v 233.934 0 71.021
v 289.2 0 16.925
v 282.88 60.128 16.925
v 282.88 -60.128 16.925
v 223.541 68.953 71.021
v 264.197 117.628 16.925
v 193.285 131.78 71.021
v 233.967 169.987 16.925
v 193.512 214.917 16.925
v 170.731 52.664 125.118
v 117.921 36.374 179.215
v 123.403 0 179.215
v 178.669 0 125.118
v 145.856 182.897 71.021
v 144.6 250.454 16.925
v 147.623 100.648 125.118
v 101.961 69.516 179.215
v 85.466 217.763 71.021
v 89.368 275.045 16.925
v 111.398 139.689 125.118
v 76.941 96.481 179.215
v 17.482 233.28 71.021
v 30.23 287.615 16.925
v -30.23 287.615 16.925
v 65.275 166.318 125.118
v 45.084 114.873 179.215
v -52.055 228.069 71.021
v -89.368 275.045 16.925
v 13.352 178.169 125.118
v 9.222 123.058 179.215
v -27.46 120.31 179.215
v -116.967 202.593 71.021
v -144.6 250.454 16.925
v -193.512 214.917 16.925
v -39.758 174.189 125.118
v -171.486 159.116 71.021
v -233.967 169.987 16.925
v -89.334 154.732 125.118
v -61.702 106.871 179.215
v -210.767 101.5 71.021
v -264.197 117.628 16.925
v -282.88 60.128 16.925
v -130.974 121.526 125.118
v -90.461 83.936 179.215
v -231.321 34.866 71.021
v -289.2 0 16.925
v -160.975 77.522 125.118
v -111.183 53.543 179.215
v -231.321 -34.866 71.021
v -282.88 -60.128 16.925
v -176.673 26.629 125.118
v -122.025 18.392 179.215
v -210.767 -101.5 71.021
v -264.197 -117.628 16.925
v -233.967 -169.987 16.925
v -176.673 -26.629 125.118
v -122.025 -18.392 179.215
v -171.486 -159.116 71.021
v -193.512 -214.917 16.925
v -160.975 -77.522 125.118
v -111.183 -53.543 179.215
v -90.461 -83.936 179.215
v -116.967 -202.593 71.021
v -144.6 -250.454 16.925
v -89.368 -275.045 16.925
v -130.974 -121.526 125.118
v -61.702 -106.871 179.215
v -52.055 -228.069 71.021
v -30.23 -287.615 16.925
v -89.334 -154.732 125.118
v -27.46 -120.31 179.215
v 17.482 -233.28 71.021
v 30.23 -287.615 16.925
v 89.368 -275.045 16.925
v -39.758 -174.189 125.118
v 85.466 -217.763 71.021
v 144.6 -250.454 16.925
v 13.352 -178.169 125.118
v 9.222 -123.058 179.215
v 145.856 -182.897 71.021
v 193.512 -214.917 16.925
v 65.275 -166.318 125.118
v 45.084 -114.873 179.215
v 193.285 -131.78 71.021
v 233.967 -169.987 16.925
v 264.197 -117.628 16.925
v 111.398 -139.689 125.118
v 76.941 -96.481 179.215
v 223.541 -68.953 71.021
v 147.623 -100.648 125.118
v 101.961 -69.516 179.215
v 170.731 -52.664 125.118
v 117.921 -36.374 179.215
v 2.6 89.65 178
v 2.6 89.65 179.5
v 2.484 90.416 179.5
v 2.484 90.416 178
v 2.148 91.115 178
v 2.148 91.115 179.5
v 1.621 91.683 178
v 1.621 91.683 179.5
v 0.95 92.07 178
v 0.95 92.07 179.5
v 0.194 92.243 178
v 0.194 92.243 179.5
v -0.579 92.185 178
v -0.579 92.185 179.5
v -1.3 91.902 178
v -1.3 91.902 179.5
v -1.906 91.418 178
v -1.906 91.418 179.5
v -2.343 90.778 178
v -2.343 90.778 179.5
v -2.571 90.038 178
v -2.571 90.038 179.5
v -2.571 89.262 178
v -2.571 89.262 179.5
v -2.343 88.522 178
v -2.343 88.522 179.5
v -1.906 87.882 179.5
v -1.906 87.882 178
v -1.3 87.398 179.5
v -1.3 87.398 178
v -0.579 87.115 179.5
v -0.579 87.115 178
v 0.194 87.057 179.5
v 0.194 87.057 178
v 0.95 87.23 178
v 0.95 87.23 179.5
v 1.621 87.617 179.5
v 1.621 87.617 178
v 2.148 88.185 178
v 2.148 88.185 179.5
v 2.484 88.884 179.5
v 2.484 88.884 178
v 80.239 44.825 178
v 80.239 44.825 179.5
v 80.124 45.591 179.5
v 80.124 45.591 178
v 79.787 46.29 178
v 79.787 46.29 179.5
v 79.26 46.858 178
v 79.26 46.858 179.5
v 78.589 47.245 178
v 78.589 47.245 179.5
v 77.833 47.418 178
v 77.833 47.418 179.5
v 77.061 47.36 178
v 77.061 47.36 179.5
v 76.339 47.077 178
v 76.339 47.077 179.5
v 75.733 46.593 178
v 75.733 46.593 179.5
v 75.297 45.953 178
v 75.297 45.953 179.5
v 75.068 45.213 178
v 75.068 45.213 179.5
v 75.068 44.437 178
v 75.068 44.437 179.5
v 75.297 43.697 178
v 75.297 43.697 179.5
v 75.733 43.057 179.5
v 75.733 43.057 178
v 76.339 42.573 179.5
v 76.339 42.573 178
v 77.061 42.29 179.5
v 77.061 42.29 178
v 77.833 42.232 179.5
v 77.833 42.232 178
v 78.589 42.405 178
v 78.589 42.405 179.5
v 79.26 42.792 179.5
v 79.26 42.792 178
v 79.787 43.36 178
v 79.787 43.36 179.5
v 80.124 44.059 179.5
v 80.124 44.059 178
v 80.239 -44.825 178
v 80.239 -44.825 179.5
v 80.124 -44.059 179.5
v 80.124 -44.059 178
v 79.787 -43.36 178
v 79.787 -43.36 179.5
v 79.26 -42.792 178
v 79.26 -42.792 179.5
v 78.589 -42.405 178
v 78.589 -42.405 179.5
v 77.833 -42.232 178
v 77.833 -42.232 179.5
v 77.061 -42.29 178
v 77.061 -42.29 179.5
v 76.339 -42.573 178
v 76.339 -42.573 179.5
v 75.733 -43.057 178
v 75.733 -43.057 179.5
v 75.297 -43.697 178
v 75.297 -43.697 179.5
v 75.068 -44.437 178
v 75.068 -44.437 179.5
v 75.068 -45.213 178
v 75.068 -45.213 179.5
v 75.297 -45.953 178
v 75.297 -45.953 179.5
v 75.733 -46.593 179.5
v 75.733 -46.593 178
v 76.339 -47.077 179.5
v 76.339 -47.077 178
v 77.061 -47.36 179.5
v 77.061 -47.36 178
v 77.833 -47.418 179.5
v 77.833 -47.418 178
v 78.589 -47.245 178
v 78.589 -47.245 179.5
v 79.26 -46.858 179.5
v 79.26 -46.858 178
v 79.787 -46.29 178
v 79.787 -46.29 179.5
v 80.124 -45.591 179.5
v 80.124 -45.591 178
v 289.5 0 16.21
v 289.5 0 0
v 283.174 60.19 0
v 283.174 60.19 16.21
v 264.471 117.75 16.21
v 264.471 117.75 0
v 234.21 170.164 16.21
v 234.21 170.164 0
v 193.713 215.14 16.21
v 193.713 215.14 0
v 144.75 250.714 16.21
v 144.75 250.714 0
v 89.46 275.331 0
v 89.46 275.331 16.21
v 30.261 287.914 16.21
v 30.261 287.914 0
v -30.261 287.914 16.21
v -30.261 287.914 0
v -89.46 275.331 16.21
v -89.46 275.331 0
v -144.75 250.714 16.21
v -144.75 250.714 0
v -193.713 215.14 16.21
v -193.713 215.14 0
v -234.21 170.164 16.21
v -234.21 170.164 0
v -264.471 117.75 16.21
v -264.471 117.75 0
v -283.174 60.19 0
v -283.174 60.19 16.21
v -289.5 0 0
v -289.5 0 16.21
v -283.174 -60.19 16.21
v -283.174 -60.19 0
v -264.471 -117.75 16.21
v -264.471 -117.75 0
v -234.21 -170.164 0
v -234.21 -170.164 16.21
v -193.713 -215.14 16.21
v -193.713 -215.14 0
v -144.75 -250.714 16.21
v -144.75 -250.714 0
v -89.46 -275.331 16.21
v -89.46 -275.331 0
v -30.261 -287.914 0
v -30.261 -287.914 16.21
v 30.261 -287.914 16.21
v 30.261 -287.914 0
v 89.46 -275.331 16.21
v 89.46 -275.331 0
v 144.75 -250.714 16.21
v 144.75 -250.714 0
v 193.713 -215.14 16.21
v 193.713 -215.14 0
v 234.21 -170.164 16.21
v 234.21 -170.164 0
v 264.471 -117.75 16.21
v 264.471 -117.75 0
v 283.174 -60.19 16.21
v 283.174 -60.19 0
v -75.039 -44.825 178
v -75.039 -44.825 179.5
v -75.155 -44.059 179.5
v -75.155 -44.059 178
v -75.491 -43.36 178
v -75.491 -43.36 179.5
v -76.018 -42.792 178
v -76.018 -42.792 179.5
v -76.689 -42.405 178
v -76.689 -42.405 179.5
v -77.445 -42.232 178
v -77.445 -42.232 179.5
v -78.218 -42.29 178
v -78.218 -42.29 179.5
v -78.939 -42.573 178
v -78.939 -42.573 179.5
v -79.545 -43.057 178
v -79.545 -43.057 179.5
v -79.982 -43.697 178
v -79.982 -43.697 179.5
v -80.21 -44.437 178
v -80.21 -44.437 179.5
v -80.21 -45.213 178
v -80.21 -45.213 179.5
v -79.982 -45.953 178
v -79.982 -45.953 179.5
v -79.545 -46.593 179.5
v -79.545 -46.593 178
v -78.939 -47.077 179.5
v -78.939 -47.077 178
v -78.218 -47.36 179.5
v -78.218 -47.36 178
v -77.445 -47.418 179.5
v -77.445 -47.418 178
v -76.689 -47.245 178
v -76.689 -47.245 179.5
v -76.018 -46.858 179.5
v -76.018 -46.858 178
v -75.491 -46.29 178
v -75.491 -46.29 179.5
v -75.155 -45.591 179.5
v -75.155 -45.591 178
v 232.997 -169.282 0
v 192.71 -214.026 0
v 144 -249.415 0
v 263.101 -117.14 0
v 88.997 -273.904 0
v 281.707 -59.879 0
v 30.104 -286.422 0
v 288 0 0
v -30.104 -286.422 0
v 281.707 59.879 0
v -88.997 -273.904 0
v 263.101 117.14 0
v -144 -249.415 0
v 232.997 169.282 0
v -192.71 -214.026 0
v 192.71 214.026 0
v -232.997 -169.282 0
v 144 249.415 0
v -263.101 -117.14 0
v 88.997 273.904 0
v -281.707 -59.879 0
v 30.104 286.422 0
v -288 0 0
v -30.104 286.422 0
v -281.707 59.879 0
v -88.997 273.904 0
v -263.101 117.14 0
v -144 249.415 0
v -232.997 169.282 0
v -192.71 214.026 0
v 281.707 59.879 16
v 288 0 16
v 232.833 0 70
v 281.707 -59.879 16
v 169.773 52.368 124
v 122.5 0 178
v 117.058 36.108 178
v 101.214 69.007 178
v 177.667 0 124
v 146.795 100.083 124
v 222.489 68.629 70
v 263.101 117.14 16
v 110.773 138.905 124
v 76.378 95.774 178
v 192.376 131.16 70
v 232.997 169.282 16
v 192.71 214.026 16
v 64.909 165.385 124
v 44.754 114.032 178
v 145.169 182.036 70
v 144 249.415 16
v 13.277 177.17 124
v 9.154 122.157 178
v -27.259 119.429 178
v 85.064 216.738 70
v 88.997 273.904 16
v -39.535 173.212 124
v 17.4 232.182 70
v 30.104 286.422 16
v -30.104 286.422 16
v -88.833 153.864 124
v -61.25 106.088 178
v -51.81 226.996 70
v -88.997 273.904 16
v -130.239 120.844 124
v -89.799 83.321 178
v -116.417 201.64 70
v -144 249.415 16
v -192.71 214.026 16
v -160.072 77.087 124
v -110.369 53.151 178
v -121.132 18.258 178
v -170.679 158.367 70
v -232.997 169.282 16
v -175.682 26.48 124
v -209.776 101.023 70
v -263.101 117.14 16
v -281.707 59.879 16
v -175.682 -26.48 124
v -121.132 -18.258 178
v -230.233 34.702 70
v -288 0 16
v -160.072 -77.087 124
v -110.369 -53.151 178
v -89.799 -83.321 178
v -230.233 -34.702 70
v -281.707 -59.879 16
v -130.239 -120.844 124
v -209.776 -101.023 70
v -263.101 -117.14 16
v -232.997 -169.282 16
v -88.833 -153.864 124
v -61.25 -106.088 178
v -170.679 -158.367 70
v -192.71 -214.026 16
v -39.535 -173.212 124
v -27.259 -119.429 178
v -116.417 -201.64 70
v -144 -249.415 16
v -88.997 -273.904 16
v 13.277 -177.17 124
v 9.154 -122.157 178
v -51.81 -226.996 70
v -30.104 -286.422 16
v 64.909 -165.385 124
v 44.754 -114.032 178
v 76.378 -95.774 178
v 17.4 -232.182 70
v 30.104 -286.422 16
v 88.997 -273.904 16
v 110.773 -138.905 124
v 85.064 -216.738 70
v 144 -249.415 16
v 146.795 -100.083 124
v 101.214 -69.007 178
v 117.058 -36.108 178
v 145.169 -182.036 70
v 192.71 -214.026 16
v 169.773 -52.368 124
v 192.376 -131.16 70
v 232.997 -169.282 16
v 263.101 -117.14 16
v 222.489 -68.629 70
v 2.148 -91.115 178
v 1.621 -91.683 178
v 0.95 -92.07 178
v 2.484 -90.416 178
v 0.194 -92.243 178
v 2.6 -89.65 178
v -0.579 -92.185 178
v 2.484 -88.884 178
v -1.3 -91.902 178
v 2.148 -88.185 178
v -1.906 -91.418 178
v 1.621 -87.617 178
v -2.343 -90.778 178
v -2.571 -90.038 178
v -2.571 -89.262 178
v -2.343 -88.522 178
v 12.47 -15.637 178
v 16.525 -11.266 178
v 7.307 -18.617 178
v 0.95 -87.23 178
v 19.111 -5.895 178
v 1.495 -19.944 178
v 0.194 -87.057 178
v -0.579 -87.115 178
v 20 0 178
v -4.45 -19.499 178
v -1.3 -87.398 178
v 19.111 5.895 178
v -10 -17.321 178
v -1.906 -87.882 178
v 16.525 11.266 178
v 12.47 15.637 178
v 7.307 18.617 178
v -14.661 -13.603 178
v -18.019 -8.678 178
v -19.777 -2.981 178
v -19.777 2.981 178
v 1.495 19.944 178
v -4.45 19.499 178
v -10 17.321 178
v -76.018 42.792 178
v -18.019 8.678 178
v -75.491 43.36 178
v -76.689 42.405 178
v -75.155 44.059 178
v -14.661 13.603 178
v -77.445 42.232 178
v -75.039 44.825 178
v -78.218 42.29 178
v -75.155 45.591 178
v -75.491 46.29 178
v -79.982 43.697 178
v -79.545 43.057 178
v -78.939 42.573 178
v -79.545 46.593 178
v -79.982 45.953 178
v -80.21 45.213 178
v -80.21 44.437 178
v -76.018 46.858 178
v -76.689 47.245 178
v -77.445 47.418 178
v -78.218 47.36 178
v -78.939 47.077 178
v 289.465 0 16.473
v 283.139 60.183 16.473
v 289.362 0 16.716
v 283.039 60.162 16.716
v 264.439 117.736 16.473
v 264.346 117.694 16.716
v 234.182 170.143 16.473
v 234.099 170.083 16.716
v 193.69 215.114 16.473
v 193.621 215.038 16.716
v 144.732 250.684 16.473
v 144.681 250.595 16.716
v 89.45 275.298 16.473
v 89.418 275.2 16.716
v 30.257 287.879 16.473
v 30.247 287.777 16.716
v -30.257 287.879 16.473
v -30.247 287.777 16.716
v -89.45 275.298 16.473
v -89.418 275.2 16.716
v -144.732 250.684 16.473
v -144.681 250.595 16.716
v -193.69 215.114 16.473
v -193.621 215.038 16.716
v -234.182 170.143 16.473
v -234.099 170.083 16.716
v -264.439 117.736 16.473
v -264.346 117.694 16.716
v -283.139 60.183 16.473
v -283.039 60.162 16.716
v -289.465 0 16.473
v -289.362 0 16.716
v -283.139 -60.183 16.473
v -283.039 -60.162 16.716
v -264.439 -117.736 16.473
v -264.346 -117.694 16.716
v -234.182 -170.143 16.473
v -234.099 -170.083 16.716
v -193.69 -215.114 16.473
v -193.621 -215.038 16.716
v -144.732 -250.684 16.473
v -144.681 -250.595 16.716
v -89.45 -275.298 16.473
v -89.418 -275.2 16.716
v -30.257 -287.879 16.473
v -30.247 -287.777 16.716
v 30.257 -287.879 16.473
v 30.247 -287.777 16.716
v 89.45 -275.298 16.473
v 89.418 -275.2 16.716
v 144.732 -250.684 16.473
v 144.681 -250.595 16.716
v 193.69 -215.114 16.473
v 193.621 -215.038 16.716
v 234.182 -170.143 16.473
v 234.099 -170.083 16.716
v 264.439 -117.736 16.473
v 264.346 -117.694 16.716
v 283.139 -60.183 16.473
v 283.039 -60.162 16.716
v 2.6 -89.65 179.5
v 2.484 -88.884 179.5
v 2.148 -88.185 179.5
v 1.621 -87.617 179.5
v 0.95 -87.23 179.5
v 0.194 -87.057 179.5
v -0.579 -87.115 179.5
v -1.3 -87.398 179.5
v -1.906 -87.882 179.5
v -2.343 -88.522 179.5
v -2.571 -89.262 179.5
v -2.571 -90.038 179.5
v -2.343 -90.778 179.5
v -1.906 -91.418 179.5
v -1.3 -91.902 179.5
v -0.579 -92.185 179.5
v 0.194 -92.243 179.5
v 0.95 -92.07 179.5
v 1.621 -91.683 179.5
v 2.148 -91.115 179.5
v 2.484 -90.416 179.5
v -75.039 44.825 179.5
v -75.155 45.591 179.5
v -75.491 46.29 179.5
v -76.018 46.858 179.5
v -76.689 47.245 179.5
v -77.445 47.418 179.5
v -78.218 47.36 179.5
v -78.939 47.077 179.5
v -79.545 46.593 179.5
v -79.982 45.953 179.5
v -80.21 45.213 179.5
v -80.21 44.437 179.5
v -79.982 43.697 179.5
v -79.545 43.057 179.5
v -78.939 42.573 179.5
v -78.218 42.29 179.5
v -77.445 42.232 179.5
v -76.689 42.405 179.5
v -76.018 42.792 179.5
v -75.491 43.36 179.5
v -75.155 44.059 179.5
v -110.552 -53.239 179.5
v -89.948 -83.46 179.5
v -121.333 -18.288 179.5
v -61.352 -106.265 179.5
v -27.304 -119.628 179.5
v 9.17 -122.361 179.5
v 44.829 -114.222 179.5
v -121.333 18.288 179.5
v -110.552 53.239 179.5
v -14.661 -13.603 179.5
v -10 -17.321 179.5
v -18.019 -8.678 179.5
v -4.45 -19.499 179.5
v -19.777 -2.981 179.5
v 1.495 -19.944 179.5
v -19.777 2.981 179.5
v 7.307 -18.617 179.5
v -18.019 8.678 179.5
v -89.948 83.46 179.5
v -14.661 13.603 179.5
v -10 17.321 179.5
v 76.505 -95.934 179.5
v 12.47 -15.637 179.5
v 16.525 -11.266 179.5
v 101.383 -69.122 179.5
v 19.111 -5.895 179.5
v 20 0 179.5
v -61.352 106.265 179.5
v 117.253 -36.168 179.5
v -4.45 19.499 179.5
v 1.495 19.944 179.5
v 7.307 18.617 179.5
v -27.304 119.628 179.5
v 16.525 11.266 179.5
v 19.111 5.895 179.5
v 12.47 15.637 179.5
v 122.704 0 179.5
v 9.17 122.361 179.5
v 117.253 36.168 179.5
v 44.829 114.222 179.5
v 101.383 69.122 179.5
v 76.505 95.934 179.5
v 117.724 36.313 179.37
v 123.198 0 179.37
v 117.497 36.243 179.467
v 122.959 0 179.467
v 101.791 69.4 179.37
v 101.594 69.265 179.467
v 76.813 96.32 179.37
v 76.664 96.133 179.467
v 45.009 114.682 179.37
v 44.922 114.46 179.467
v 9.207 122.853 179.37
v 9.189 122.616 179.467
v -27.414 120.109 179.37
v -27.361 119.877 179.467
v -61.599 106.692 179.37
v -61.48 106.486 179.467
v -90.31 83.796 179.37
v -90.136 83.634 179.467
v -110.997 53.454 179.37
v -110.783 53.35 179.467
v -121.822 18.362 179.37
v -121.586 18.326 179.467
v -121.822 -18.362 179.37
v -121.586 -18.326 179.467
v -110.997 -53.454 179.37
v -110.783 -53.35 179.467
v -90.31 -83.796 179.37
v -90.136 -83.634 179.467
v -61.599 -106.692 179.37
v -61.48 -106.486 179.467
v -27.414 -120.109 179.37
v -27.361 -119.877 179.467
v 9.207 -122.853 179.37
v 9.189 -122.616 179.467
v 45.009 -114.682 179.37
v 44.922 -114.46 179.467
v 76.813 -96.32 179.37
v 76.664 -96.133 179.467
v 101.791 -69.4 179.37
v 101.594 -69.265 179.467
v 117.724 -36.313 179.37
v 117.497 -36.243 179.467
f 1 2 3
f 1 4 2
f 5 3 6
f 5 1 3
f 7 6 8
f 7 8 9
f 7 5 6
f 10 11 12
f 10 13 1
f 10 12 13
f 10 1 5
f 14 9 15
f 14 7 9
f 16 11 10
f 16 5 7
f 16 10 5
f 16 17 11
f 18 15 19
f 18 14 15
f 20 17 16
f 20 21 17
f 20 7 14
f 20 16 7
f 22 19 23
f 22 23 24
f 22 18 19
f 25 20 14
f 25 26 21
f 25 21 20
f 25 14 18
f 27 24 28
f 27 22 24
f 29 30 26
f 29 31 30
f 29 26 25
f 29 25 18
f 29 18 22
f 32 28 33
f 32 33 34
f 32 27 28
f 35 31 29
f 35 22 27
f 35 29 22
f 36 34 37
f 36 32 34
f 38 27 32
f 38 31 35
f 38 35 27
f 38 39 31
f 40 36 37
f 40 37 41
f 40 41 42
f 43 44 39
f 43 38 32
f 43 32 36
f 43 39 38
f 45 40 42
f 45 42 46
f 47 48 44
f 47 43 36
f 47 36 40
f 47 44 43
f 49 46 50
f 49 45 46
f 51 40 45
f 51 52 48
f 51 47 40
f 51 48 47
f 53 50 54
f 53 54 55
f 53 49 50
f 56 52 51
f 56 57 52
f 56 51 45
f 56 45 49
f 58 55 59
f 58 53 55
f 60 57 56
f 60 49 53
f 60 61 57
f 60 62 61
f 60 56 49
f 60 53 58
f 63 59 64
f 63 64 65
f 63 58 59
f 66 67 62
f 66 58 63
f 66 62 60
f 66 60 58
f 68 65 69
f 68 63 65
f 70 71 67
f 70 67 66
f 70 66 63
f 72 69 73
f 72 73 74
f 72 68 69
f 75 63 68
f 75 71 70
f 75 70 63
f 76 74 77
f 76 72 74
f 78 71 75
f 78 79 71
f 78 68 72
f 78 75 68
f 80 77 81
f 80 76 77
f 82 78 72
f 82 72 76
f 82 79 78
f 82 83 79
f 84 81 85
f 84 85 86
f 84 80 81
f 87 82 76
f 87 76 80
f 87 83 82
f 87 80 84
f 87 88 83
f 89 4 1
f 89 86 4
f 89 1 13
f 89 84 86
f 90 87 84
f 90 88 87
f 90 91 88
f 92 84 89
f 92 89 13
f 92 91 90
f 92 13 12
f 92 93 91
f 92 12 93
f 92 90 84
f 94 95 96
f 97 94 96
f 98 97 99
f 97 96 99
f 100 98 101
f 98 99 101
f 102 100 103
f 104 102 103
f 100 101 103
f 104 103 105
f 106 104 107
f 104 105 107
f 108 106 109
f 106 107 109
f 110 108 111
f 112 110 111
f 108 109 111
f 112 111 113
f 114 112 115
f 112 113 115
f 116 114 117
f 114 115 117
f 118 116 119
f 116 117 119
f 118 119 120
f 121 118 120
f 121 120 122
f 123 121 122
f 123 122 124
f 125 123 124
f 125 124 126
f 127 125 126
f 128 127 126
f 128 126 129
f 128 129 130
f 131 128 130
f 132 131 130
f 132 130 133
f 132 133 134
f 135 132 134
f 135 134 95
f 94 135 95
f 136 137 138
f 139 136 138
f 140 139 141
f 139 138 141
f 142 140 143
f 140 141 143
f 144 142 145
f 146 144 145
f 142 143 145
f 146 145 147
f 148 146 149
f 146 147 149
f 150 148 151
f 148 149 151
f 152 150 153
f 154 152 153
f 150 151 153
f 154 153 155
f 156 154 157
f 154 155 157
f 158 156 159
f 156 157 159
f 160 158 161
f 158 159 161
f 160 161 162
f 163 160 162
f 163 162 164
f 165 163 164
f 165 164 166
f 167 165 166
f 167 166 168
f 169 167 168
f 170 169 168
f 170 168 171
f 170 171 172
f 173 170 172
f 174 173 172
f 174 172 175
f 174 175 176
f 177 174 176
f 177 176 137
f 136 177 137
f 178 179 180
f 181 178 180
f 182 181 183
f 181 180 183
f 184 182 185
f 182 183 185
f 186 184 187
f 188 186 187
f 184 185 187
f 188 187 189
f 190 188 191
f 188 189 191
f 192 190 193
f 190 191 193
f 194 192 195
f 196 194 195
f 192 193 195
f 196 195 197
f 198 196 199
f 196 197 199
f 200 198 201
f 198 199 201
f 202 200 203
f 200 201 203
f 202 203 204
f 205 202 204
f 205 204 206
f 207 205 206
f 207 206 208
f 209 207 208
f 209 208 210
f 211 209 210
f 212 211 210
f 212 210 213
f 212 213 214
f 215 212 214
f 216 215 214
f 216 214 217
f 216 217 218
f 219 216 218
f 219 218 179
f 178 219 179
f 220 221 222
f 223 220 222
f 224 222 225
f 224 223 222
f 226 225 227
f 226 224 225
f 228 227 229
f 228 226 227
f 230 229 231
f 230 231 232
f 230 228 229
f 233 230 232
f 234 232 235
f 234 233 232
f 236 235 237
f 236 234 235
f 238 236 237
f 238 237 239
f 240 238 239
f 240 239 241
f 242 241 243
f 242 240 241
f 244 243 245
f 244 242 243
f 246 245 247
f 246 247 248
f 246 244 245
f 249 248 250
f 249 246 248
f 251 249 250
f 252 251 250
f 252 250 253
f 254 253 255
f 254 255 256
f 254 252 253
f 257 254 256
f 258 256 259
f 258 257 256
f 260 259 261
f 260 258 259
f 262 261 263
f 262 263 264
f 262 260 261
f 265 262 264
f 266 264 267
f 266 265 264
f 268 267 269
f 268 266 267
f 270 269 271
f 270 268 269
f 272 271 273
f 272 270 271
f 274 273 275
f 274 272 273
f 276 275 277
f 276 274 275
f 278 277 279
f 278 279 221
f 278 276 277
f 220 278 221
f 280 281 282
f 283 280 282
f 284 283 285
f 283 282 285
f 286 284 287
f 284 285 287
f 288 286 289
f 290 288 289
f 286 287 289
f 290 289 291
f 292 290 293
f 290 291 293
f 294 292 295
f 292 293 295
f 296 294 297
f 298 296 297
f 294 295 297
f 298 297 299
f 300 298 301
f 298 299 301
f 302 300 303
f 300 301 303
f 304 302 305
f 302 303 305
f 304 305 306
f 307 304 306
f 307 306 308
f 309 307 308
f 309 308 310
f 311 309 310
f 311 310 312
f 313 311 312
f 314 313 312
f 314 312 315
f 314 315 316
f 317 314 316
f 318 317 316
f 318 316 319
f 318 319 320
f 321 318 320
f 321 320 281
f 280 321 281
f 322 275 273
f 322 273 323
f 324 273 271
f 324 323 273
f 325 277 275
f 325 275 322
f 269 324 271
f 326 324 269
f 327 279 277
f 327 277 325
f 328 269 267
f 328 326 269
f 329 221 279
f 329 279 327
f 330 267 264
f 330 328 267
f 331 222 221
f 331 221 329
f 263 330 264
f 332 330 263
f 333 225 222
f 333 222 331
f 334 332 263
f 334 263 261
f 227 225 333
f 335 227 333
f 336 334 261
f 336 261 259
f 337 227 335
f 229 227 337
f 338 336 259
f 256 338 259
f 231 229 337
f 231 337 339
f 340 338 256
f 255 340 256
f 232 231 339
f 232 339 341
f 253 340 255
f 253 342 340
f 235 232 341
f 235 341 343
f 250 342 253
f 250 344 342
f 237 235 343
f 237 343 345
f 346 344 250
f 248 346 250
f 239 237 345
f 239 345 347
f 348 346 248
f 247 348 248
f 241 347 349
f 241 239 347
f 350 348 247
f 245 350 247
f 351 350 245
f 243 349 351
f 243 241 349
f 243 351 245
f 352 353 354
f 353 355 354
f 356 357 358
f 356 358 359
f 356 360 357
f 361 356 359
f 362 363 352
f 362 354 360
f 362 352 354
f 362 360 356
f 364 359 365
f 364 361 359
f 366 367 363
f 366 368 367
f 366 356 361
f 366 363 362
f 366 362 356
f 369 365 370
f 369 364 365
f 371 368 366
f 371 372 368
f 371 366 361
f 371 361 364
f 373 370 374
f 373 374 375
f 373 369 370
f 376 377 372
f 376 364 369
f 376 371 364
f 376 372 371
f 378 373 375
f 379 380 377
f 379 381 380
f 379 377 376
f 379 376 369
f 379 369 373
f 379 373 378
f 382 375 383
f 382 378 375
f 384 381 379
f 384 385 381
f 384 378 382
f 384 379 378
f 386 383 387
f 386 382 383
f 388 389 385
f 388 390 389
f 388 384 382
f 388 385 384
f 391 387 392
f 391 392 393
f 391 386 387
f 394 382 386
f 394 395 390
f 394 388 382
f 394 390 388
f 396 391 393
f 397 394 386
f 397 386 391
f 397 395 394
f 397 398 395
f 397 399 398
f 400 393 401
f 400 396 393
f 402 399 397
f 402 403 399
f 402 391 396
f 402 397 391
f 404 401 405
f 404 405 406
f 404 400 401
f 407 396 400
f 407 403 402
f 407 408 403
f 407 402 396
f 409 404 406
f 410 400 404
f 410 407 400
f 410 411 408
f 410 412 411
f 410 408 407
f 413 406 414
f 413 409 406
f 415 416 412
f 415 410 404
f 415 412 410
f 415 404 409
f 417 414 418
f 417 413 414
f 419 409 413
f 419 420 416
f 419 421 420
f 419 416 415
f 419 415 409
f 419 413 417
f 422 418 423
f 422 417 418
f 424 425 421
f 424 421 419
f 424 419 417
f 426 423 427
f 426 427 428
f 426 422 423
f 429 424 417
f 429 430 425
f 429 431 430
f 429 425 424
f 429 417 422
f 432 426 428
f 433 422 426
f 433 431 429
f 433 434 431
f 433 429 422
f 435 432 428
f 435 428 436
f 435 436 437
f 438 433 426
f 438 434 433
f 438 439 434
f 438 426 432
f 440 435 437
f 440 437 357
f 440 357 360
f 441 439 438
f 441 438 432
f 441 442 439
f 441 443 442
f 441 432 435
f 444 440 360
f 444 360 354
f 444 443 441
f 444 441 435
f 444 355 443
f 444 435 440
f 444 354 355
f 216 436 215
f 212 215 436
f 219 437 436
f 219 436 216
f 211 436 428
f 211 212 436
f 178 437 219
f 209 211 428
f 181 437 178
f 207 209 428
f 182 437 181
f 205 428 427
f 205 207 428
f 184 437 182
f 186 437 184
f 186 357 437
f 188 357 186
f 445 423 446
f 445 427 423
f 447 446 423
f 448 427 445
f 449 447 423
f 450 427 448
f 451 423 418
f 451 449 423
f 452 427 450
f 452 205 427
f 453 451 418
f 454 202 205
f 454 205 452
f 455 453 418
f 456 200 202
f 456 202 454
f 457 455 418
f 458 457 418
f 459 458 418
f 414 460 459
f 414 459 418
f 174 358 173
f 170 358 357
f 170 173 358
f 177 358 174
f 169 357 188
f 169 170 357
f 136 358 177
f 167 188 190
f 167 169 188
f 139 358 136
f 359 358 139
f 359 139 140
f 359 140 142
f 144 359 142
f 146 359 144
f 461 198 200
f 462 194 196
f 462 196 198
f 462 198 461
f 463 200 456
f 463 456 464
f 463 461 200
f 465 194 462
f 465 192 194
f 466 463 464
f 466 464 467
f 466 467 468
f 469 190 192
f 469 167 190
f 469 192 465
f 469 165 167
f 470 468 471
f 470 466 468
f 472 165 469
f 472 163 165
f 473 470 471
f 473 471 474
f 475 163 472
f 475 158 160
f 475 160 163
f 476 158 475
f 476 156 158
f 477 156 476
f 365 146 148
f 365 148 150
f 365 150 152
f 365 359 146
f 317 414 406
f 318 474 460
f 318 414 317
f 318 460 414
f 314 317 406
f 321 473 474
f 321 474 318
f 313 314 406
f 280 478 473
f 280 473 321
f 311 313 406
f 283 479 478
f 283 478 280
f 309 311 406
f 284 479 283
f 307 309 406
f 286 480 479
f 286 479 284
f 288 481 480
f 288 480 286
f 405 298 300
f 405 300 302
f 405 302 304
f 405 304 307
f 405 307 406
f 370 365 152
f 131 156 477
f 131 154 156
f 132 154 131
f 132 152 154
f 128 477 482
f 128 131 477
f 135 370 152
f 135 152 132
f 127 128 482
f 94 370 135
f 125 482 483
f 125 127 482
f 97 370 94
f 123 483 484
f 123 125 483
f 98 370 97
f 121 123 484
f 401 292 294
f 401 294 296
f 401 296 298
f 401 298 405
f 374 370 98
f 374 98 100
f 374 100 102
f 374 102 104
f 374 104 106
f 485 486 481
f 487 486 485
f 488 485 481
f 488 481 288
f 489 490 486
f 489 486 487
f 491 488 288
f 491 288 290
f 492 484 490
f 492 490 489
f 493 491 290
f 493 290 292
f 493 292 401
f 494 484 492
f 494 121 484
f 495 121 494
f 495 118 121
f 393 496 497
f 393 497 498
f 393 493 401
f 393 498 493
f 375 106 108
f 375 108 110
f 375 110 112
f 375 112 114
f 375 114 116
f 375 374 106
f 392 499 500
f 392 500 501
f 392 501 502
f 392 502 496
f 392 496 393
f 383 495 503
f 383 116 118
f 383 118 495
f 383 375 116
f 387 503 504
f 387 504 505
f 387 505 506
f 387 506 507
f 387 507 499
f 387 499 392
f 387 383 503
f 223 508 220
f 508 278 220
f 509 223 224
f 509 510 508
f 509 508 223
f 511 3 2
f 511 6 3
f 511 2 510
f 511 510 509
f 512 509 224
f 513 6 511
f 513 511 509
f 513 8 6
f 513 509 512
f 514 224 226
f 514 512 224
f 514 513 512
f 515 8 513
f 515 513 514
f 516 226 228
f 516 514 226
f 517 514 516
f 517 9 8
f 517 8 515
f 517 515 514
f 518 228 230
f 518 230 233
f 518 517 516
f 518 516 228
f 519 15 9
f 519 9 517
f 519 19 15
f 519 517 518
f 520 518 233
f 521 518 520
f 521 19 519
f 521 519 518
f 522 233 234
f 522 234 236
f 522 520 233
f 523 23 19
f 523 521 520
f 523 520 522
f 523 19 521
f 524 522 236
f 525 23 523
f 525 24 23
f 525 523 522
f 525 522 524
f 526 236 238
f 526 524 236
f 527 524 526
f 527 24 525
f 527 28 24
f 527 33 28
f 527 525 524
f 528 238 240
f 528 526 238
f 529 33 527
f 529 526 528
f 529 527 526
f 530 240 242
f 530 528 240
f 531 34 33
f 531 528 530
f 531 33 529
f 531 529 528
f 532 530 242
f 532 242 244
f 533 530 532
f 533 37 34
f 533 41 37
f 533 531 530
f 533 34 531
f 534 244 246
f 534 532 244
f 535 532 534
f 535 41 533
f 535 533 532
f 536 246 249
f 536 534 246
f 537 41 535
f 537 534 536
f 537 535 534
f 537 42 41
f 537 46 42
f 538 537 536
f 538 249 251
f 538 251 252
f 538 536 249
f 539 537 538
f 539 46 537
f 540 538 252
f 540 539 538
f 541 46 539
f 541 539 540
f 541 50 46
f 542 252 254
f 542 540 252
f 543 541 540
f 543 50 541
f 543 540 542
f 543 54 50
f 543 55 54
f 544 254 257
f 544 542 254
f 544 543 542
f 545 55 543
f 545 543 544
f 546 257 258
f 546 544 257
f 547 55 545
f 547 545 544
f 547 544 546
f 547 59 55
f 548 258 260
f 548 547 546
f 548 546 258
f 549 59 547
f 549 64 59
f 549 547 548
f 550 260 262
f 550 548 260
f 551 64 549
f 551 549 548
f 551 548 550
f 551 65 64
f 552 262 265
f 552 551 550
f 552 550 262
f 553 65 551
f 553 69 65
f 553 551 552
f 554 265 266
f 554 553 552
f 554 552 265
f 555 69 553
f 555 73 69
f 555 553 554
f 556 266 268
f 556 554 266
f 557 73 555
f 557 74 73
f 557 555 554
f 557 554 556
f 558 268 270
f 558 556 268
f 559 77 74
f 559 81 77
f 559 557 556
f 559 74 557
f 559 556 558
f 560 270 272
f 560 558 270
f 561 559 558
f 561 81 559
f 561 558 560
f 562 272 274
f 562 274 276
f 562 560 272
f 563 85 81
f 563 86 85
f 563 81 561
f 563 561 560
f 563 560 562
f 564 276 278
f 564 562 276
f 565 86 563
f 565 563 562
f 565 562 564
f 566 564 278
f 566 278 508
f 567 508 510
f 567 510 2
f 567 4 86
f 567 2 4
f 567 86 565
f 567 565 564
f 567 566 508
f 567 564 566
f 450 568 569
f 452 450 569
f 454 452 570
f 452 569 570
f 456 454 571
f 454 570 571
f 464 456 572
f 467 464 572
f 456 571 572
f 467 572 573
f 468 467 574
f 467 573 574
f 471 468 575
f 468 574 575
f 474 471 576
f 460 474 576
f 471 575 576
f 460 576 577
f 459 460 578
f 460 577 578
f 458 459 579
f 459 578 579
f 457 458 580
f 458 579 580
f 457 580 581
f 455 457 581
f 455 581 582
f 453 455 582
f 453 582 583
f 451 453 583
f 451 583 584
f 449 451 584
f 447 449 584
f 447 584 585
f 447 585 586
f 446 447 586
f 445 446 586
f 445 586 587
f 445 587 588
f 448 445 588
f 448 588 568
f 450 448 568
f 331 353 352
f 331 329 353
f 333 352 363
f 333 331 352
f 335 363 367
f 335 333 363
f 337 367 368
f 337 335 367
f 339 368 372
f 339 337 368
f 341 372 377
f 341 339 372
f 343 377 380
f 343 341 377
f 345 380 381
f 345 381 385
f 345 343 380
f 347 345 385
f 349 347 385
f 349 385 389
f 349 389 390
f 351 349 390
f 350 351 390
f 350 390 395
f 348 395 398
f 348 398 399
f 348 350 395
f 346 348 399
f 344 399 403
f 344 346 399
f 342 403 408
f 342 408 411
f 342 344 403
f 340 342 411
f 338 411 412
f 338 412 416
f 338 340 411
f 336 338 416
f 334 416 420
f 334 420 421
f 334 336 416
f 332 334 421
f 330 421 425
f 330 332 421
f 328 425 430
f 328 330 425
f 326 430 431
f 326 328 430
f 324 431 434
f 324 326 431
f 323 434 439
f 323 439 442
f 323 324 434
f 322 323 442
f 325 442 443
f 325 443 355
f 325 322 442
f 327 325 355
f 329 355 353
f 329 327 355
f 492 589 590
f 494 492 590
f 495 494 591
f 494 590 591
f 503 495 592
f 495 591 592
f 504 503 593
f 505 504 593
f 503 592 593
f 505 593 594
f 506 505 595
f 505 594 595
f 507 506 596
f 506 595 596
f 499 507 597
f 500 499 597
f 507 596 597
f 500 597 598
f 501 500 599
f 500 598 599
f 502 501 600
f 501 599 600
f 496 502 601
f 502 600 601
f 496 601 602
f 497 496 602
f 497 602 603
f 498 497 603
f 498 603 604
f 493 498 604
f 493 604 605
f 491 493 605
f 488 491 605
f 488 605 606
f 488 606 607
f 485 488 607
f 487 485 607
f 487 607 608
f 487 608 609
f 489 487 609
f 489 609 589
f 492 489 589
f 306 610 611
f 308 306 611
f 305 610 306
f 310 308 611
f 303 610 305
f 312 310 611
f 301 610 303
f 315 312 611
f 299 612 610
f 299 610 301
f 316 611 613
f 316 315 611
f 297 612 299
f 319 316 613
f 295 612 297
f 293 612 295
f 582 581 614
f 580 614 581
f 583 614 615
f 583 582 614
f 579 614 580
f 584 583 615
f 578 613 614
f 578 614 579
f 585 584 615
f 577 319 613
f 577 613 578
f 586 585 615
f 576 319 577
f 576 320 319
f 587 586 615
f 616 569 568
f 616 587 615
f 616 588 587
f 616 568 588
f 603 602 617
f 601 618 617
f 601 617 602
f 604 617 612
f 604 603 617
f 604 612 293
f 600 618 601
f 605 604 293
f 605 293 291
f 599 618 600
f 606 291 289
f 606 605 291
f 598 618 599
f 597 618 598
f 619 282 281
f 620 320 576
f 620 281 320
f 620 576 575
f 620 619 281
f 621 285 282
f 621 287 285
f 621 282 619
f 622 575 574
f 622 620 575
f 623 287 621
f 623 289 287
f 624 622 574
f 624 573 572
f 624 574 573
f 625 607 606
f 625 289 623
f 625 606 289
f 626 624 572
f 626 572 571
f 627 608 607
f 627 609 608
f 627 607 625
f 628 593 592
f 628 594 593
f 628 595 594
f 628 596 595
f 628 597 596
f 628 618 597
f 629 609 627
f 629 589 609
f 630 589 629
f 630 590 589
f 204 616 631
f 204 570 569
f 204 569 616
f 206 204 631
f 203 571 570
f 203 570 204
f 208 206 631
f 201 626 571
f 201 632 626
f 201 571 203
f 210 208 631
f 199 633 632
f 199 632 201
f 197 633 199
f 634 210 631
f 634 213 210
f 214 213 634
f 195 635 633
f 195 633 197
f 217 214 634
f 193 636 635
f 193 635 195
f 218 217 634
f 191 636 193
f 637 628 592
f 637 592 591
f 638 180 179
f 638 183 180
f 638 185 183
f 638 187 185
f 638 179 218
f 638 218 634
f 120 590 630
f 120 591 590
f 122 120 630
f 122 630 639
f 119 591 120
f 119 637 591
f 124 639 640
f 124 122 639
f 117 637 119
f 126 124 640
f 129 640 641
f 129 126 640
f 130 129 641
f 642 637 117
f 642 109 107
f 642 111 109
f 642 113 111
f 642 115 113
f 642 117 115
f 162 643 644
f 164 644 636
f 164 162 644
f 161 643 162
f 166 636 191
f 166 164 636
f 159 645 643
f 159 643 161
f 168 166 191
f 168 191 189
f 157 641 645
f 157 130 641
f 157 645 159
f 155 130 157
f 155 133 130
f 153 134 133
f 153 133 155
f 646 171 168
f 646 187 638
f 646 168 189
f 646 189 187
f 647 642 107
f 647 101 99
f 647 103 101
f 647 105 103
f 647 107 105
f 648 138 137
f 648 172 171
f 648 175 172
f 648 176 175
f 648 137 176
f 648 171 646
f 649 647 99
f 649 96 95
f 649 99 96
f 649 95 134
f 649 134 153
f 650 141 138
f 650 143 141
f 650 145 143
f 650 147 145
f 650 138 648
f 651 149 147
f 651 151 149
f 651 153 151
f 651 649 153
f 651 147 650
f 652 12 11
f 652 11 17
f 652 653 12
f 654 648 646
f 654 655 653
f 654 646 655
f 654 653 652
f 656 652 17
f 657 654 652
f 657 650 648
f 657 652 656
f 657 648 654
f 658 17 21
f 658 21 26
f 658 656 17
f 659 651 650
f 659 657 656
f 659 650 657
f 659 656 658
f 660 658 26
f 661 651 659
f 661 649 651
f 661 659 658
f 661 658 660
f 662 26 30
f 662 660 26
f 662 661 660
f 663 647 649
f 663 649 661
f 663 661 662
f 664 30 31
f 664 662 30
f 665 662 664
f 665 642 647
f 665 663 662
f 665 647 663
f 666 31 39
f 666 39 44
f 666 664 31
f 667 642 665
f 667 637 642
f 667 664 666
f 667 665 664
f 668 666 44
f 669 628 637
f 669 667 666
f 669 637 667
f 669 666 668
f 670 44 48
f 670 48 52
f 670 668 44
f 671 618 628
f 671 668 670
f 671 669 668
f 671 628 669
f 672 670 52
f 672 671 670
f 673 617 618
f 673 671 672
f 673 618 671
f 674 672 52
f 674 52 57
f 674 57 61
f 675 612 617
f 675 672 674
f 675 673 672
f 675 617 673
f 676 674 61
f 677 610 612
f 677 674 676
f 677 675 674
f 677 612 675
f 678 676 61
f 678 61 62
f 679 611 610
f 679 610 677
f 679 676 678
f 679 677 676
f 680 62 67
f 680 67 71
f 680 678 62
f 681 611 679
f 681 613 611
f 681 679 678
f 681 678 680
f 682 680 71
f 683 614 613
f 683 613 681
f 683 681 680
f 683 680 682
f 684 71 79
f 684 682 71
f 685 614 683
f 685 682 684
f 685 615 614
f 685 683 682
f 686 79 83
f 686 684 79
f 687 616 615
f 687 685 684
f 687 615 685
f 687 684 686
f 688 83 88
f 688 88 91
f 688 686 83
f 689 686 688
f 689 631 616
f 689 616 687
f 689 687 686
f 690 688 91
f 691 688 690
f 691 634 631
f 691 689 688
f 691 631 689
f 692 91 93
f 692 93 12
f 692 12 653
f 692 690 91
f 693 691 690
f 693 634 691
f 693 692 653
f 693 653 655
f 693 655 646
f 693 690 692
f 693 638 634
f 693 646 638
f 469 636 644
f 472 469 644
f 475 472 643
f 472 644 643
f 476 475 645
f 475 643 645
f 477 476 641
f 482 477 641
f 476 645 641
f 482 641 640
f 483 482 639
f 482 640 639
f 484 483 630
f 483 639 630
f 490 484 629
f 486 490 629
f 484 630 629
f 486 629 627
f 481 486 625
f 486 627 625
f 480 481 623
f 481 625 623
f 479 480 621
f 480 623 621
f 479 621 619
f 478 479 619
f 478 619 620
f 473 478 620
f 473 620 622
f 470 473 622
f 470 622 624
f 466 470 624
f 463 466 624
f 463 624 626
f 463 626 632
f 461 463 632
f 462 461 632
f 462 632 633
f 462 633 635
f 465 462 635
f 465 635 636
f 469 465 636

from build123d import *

# Parameters (mm, degrees)
F2_R     = 5
F3_DEPTH = 1.5
F4_R     = 20
F5_DEPTH = 179.501
F6_R     = 2.6
F7_DEPTH = 179.501


with BuildPart() as f1:
    # F0 (on Front) → F1 (revolve)
    with BuildSketch(Plane.XZ):
        with BuildLine():
            Line((288, 16), (288, 0))
            Line((288, 0), (289.5, 0))
            Line((289.5, 0), (289.5, 16.210244))
            ThreePointArc((289.5, 16.210244), (289.421822, 16.597858), (289.19951, 16.924867))
            Line((289.19951, 16.924867), (123.403494, 179.214623))
            ThreePointArc((123.403494, 179.214623), (123.081725, 179.425911), (122.703984, 179.5))
            Line((122.703984, 179.5), (0, 179.5))
            Line((0, 179.5), (0, 178))
            Line((0, 178), (122.5, 178))
            Line((122.5, 178), (288, 16))
        make_face()
    revolve(axis=Axis((0, 0, 89), (0, 0, 1)))

    # F2 (on face) → F3 (cut, through all)
    with BuildSketch(Plane.XY.offset(179.5)):
        Circle(F2_R)
    extrude(amount=-F3_DEPTH, mode=Mode.SUBTRACT)

    # F4 (on face) → F5 (cut, through all)
    with BuildSketch(Plane.XY.offset(179.5)):
        Circle(F4_R)
    extrude(amount=-F5_DEPTH, mode=Mode.SUBTRACT)

    # F6 (on face) → F7 (cut, through all)
    with BuildSketch(Plane.XY.offset(179.5)):
        with Locations((0, 89.65)):
            Circle(F6_R)
        with Locations((-77.639177, 44.825)):
            Circle(F6_R)
        with Locations((-77.639177, -44.825)):
            Circle(F6_R)
        with Locations((0, -89.65)):
            Circle(F6_R)
        with Locations((77.639177, -44.825)):
            Circle(F6_R)
        with Locations((77.639177, 44.825)):
            Circle(F6_R)
    extrude(amount=-F7_DEPTH, mode=Mode.SUBTRACT)


solid = f1.part
